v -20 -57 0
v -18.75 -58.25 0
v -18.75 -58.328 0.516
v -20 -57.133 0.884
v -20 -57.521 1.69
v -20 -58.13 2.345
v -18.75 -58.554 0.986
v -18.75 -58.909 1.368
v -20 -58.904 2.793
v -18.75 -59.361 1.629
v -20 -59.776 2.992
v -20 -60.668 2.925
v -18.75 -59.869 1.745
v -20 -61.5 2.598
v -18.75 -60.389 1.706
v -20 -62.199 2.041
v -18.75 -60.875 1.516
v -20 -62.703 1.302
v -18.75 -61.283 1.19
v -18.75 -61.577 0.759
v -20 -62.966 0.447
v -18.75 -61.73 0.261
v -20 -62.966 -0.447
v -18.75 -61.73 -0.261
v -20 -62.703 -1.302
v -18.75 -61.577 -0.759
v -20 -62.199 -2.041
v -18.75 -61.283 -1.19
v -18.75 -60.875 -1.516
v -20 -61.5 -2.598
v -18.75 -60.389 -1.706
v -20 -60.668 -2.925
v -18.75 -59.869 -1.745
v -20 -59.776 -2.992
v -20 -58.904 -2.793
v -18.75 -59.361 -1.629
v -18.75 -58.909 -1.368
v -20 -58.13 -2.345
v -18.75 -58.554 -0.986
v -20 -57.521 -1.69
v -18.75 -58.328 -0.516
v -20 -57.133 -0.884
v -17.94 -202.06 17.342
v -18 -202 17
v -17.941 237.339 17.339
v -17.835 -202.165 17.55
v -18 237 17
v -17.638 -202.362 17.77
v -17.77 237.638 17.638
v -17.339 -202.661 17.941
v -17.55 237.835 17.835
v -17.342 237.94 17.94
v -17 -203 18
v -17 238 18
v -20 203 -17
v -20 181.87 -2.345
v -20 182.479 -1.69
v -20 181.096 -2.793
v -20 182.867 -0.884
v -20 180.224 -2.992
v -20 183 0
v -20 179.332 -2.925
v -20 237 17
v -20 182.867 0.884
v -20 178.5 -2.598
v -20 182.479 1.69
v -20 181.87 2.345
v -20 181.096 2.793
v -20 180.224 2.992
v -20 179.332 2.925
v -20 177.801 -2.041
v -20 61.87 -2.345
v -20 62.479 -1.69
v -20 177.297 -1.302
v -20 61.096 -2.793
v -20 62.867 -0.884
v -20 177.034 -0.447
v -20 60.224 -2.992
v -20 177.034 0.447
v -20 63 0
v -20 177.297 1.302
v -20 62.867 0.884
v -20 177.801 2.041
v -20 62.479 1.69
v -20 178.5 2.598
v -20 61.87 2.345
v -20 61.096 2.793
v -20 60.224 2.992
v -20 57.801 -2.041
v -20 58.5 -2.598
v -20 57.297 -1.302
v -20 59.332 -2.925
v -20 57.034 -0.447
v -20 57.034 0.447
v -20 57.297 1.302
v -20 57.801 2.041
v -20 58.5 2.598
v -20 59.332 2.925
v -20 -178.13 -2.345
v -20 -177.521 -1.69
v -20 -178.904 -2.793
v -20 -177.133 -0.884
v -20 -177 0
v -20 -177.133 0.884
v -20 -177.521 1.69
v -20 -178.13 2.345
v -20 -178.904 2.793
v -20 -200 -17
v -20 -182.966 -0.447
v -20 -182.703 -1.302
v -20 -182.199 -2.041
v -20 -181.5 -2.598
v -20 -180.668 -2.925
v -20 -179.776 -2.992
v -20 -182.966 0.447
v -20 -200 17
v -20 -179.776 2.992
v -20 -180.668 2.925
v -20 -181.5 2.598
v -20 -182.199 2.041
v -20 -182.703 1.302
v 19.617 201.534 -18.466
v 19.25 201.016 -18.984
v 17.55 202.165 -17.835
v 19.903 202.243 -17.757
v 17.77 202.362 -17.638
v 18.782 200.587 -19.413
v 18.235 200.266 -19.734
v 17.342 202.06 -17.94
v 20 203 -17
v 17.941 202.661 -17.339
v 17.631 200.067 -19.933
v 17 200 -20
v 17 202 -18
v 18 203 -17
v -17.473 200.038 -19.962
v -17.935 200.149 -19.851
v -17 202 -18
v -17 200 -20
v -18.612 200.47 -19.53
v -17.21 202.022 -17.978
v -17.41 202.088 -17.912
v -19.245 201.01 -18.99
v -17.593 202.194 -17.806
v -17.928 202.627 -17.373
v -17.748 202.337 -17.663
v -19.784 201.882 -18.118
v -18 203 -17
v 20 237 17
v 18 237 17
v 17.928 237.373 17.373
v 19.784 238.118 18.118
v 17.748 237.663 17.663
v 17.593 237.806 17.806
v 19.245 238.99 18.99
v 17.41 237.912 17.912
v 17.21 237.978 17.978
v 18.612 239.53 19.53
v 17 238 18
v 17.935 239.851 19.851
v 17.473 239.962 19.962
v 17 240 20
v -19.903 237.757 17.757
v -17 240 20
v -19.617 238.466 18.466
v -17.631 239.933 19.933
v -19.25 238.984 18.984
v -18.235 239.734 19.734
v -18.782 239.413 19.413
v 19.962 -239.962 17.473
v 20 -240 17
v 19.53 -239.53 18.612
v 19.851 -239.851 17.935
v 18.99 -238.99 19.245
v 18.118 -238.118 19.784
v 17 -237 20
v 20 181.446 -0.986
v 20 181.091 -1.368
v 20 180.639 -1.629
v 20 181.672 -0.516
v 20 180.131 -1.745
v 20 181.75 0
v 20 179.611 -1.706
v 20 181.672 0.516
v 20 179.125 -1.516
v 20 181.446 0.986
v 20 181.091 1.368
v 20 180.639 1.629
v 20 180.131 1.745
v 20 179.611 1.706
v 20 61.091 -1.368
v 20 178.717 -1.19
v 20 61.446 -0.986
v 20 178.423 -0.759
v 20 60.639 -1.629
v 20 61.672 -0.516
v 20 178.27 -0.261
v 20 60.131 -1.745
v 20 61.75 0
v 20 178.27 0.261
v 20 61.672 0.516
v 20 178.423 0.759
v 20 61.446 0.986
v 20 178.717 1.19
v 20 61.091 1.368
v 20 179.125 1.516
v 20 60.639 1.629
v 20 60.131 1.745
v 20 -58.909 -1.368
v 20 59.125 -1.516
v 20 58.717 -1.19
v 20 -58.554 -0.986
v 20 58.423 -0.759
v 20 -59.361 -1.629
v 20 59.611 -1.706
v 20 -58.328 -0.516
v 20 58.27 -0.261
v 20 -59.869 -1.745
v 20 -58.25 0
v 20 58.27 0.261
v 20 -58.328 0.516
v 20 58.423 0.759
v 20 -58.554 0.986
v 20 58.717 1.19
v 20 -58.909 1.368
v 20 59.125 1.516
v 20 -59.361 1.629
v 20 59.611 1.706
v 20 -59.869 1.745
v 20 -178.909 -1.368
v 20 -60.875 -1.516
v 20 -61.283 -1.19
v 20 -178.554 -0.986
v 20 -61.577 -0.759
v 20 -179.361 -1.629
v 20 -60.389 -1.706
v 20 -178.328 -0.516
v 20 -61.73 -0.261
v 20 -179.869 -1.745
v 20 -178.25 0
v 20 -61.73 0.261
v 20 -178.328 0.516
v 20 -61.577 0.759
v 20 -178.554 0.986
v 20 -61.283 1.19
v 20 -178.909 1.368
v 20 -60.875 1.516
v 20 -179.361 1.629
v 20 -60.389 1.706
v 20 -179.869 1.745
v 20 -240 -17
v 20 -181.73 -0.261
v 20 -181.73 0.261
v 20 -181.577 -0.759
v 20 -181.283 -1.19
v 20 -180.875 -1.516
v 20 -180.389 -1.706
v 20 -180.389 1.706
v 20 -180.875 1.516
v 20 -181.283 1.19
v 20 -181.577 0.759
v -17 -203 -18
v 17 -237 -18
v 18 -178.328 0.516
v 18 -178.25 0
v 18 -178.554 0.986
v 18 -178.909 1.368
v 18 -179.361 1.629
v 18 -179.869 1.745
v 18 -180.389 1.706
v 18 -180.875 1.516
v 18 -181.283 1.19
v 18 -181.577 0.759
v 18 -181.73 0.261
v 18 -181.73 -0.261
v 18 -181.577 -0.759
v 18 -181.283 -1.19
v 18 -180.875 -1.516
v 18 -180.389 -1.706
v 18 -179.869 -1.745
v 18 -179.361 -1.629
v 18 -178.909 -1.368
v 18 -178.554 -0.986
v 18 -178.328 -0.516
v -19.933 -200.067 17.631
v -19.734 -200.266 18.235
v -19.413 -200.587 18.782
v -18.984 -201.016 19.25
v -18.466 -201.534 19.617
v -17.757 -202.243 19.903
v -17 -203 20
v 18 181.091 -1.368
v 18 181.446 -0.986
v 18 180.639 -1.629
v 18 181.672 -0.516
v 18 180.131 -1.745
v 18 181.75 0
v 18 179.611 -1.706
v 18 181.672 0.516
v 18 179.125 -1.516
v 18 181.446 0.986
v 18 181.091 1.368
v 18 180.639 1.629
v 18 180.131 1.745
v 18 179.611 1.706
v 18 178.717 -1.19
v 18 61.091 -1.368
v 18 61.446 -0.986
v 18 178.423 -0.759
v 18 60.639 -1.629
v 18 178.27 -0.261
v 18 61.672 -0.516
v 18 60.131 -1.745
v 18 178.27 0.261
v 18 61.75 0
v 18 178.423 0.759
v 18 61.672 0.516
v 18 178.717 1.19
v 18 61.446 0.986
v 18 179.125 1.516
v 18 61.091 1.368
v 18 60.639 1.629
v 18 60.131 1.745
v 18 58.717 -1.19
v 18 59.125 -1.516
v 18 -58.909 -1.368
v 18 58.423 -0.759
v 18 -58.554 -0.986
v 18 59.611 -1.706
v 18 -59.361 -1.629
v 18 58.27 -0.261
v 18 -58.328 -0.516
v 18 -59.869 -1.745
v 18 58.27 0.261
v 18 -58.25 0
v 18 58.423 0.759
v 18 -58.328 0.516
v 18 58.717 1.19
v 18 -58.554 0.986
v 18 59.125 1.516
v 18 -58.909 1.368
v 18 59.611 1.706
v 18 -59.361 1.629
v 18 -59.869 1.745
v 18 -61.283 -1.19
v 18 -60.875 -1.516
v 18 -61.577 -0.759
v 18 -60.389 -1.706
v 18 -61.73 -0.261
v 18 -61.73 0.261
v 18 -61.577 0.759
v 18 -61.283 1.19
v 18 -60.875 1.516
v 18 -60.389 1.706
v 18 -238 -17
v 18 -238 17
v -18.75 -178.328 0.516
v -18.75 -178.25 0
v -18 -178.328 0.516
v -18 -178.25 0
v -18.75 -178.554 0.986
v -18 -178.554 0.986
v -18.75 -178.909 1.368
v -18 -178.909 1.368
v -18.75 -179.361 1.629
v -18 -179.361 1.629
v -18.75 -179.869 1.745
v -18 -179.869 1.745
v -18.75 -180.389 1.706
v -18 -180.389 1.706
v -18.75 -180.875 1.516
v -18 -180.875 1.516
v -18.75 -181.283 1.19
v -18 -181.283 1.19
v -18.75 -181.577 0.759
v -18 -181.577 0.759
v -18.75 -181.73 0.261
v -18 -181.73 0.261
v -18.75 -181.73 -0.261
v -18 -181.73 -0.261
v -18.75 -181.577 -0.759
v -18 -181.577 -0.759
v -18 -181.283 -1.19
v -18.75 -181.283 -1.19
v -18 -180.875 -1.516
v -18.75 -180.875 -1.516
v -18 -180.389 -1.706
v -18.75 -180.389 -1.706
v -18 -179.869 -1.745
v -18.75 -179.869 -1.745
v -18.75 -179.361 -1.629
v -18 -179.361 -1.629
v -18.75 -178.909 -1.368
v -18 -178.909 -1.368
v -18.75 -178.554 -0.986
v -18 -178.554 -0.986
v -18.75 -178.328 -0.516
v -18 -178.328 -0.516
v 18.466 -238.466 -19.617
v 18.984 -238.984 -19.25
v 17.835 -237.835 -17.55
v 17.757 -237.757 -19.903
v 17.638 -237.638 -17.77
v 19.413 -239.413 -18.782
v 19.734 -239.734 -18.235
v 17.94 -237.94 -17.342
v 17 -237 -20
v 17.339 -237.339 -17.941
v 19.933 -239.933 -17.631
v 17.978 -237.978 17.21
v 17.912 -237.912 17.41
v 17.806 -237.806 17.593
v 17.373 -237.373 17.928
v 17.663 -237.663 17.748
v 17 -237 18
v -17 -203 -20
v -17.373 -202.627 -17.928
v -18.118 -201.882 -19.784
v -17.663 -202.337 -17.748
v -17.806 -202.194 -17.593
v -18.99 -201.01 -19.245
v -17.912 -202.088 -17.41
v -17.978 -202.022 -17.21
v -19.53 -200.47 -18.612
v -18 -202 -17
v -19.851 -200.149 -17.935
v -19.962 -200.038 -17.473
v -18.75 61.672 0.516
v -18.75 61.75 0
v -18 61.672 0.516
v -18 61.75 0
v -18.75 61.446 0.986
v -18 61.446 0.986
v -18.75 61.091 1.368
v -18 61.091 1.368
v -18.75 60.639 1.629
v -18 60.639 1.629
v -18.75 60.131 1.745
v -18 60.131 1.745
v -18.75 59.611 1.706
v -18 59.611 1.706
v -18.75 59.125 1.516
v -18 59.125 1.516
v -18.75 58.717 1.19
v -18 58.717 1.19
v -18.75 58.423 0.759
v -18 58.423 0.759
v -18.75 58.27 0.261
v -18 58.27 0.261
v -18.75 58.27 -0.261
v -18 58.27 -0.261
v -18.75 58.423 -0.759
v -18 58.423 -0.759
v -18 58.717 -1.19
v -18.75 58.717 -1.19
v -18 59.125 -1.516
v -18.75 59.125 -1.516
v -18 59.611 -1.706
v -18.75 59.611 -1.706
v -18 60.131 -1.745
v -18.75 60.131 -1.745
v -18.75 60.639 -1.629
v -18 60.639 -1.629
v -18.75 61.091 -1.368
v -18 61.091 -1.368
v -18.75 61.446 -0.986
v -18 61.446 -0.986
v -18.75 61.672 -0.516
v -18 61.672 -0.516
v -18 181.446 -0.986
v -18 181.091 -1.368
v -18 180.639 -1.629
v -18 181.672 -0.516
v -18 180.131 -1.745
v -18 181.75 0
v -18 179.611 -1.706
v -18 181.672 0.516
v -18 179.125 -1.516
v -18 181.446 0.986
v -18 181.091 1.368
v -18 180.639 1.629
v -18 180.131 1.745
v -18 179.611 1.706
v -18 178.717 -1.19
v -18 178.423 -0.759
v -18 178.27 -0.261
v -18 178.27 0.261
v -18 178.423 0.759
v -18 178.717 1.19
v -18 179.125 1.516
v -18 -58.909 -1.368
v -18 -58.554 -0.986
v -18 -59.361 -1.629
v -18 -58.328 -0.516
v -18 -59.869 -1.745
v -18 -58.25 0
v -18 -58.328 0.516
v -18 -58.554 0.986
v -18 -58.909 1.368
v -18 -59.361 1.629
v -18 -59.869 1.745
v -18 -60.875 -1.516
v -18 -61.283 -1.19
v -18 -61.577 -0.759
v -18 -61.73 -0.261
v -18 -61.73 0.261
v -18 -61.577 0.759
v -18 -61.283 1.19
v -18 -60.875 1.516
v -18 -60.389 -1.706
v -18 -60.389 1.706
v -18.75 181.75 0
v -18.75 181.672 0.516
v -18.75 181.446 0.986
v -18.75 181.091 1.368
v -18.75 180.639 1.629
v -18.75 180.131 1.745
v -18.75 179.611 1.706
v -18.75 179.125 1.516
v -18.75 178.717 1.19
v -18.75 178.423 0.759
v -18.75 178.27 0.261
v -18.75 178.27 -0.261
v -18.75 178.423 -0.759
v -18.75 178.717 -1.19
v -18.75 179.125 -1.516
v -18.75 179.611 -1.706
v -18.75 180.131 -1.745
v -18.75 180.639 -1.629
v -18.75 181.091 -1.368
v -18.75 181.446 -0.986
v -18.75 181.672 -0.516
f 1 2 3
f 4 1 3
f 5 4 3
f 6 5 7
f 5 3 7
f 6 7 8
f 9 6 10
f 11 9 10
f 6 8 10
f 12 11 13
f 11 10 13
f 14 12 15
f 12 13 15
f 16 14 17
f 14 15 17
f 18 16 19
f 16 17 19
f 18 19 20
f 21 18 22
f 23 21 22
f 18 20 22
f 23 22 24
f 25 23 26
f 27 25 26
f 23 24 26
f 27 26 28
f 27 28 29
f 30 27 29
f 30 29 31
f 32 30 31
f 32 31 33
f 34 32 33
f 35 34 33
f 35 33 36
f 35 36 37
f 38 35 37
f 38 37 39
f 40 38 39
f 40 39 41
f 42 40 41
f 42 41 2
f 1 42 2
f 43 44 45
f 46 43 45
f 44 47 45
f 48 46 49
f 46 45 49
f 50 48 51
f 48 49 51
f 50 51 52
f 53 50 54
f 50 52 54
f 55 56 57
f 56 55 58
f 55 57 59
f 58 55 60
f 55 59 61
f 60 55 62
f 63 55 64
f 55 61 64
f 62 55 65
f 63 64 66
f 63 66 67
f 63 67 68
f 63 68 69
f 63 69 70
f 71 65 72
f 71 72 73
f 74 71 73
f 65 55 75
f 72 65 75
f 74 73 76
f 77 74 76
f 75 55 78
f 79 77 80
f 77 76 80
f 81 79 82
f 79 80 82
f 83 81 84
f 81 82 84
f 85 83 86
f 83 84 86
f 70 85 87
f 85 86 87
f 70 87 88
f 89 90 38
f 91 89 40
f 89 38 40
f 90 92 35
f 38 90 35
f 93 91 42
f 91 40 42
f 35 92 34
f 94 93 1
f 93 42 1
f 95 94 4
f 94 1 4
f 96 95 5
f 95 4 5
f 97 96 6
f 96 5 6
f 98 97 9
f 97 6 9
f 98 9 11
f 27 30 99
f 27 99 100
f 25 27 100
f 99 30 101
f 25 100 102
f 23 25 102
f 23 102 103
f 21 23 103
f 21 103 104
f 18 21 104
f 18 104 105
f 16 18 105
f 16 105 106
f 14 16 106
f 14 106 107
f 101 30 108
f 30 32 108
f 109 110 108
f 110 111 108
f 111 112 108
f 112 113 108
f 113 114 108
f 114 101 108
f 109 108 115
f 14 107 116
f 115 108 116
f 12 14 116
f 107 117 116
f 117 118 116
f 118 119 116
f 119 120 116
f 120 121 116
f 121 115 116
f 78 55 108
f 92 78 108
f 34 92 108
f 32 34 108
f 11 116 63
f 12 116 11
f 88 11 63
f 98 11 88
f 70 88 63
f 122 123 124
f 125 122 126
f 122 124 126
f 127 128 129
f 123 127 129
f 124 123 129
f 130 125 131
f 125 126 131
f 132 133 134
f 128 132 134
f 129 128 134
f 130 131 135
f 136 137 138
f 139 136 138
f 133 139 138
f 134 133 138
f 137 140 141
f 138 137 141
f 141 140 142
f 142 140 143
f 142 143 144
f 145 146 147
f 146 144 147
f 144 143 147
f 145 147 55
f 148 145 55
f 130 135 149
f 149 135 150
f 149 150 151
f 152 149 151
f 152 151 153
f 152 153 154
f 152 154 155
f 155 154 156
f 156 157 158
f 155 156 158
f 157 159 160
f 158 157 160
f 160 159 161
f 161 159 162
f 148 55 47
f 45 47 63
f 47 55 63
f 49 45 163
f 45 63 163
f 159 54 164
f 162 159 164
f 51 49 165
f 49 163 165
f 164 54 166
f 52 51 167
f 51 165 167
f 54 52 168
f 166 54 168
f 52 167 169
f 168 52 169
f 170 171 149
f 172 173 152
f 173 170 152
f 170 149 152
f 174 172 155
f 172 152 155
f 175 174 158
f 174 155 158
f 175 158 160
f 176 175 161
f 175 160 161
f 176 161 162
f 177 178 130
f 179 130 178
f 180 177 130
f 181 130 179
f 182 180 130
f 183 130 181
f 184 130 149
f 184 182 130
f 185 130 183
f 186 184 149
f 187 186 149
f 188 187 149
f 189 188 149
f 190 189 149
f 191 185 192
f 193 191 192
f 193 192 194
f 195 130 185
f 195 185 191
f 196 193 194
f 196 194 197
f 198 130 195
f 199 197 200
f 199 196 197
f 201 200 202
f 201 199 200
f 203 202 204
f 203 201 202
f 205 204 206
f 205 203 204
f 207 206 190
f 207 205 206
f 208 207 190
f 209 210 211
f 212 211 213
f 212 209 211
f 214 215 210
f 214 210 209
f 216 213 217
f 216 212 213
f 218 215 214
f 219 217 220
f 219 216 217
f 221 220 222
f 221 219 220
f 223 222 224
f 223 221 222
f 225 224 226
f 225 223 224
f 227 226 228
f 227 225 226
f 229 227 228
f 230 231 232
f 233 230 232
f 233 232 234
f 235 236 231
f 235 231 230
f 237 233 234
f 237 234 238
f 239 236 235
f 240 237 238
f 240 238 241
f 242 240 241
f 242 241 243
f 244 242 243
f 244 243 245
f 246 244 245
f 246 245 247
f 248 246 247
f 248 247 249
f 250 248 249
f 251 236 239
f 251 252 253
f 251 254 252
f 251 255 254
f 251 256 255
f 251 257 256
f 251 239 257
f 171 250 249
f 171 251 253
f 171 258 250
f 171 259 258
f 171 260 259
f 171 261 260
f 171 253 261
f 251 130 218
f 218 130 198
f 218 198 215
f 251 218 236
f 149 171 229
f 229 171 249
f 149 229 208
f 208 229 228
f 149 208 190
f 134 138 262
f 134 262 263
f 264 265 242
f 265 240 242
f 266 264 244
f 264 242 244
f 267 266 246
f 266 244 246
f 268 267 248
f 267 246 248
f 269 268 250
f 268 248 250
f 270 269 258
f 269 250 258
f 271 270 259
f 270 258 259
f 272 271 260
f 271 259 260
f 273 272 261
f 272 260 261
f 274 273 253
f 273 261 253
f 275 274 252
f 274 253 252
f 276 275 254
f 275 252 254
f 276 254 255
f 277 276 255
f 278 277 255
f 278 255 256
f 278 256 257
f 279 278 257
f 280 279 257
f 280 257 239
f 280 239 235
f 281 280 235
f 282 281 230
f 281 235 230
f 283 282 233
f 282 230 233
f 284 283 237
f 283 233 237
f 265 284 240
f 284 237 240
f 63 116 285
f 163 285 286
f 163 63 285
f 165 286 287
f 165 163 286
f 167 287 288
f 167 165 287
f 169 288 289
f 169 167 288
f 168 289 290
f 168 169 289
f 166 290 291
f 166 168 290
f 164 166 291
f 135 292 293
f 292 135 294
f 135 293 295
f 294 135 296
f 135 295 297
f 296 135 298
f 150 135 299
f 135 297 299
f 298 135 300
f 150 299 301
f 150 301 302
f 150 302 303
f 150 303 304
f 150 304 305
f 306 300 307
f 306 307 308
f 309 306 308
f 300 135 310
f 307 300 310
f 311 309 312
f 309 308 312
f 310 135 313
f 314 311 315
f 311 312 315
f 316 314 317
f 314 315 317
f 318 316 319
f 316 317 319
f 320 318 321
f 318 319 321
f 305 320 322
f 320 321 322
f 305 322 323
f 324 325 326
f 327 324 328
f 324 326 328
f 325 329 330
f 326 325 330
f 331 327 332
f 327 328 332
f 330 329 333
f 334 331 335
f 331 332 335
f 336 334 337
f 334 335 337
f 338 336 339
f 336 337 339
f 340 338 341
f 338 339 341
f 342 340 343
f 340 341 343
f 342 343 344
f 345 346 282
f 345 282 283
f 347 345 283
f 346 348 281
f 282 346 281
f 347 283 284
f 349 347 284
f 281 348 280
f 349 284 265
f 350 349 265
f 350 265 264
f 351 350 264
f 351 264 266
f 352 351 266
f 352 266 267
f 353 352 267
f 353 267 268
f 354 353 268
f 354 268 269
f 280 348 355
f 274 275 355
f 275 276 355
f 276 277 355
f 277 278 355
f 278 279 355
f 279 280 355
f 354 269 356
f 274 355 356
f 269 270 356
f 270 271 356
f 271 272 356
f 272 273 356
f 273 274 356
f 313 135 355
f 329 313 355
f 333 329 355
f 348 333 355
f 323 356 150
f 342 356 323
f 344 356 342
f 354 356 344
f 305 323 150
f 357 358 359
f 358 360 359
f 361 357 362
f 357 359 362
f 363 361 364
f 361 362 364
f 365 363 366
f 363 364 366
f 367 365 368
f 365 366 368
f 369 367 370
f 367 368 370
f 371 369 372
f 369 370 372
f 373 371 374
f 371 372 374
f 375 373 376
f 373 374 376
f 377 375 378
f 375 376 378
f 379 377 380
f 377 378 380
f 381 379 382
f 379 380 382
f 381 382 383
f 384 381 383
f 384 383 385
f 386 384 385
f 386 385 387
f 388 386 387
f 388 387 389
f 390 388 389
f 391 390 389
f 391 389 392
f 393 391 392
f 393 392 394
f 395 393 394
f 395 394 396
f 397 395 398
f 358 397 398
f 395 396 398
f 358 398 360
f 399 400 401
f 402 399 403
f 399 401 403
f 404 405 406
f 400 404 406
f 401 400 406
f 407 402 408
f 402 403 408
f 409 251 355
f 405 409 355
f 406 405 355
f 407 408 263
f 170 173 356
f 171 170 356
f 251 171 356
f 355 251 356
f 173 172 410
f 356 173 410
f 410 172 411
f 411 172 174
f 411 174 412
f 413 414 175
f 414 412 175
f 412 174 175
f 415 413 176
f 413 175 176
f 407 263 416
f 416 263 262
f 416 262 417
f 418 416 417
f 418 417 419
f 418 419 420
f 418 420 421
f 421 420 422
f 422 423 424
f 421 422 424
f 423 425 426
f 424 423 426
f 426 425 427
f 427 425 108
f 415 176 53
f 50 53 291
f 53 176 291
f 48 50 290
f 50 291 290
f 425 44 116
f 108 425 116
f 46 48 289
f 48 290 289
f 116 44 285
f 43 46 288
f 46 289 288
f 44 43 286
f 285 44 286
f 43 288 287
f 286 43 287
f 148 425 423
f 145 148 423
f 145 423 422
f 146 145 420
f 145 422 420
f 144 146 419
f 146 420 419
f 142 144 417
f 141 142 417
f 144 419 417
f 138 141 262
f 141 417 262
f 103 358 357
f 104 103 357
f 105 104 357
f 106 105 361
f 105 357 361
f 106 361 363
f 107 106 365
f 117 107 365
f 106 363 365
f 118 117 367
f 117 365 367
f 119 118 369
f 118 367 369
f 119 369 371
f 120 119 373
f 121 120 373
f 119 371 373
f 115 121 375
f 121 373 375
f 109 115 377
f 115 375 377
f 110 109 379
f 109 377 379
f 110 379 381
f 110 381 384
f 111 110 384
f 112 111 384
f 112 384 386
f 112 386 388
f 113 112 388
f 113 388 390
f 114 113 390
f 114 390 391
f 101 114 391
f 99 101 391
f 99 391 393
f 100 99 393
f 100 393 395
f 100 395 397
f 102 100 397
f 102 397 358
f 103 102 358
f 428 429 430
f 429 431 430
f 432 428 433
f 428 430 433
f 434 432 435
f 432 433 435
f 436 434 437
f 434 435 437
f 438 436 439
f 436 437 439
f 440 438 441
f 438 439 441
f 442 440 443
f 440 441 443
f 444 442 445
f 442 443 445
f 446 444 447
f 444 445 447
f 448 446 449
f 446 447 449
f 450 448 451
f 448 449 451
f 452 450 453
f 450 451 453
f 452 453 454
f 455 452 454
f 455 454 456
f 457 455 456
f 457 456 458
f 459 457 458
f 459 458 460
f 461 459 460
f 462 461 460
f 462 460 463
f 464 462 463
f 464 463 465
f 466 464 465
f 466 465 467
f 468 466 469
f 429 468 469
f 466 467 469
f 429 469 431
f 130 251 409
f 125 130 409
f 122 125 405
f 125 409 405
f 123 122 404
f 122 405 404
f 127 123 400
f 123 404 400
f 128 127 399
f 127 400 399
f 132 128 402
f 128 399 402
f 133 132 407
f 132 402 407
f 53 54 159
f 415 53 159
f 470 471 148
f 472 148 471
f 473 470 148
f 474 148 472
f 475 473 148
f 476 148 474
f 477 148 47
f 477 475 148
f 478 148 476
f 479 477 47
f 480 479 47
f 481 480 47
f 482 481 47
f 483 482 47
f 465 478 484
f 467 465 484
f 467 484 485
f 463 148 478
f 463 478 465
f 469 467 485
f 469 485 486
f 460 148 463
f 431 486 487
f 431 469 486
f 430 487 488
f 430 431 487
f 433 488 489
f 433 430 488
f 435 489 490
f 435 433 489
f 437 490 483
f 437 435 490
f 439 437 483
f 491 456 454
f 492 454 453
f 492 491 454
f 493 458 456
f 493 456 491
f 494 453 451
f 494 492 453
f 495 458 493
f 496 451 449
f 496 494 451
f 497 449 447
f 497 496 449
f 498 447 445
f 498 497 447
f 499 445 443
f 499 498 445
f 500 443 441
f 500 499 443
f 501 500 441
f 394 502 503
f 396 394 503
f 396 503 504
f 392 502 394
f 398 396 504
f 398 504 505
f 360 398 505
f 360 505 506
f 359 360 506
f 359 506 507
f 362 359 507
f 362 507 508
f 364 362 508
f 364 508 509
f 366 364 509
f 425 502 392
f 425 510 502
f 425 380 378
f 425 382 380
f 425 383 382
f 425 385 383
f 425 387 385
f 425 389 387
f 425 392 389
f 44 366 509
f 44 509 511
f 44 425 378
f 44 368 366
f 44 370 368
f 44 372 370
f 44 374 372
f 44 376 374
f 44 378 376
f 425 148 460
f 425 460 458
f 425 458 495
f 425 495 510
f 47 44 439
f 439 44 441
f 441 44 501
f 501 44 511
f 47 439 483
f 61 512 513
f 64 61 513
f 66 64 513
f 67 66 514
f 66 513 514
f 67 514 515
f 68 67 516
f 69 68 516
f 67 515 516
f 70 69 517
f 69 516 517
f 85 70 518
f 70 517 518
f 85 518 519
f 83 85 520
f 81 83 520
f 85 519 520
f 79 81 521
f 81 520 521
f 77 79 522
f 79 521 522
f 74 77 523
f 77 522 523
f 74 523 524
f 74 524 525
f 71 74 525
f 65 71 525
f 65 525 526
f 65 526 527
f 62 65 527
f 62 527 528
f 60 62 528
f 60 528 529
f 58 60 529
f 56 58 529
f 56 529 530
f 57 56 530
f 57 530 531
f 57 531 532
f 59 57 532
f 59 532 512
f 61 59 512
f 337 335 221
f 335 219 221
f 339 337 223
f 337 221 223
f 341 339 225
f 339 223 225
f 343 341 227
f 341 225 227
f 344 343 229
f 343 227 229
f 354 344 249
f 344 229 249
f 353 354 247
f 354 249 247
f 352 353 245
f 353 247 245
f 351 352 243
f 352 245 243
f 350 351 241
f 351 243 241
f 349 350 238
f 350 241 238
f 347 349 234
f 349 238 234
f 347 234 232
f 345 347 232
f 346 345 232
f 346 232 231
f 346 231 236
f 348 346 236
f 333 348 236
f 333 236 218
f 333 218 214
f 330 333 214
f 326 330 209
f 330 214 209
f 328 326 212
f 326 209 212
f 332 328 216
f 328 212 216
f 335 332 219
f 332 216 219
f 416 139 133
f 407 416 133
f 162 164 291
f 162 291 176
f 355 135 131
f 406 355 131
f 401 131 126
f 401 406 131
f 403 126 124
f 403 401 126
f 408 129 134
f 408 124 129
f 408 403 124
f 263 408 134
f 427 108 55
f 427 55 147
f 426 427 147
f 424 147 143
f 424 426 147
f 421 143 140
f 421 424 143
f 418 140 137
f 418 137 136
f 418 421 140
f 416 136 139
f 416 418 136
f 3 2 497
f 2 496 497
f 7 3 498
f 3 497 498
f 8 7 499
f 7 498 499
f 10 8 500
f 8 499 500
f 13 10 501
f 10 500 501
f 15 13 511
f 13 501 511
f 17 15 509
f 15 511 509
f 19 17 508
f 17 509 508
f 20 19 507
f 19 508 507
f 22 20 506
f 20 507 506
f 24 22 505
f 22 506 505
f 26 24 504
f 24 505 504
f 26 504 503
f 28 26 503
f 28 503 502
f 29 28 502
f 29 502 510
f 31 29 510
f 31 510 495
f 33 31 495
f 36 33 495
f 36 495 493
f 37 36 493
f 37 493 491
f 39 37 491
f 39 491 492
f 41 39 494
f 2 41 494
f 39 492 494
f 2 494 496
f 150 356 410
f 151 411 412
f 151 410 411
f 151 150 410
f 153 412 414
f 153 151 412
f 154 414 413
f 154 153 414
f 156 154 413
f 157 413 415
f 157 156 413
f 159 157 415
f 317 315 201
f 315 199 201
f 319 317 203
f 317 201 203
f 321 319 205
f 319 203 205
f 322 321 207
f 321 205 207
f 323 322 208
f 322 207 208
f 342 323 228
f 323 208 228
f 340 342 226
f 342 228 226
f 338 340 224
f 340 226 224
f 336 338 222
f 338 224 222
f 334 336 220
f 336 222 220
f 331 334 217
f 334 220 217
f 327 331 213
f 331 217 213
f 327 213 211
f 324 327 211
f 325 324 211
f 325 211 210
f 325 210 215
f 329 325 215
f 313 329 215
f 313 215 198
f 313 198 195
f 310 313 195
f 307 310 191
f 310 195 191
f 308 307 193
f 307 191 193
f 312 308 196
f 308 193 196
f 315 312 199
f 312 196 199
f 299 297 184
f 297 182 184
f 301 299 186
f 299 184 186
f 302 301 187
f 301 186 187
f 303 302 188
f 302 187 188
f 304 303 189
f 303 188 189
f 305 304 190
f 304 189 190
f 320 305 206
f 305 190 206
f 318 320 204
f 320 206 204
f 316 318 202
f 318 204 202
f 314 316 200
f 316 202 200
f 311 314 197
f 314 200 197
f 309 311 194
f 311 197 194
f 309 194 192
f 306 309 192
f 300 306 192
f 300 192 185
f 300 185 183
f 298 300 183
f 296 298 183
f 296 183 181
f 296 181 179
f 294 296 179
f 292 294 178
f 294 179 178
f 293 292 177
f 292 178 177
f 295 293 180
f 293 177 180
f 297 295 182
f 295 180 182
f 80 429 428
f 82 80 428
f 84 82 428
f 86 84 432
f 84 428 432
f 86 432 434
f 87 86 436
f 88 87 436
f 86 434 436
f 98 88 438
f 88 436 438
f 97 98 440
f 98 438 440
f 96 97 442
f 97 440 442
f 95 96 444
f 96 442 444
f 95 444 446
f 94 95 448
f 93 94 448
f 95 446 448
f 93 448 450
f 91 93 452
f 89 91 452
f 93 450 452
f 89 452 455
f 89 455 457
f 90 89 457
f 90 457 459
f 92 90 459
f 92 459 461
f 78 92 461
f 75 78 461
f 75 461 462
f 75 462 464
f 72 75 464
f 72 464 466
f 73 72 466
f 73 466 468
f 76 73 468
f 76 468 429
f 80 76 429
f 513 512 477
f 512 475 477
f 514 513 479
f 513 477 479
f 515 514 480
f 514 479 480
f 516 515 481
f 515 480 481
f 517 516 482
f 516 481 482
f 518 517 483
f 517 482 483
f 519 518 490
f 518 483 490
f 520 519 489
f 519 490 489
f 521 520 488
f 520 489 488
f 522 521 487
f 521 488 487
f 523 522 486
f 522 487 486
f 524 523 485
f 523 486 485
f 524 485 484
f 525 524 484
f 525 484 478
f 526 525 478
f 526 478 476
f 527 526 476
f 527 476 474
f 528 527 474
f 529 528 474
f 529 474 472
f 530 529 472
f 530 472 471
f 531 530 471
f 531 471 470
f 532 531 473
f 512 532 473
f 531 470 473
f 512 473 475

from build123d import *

# Parameters (mm, degrees)
F2_W            = 40
F2_H            = 40
F3_DEPTH        = 240
F4_R            = 3
F5_T            = -2
F7_DEPTH        = 40.001
F9_DEPTH        = 40.001
F11_D           = 3.5
F11_CSINK_D     = 6
F11_CSINK_ANGLE = 90


with BuildPart() as f3:
    # F2 (on Front) → F3 (new body, symmetric)
    with BuildSketch(Plane.XZ):
        Rectangle(F2_W, F2_H)
    extrude(amount=F3_DEPTH, both=True)

    # F4
    f4_edges = [f3.edges().sort_by_distance(p)[0] for p in [
        (20, 0, 20),
        (-20, 0, 20),
        (20, 0, -20),
        (-20, 0, -20),
    ]]
    fillet(f4_edges, radius=F4_R)

    # F5
    f5_openings = [f3.faces().sort_by_distance(p)[0] for p in [
        (0, -240, 0),
        (0, 240, 0),
    ]]
    offset(amount=F5_T, openings=f5_openings)

    # F6 (on face) → F7 (cut, through all)
    with BuildSketch(Plane(origin=(-20, 0, 0), x_dir=(0, -1, 0), z_dir=(-1, 0, 0))):
        Polygon((-240, 20), (-240, -20), (-200, -20), align=None)
    extrude(amount=-F7_DEPTH, mode=Mode.SUBTRACT)

    # F8 (on face) → F9 (cut, through all)
    with BuildSketch(Plane.XY.offset(20)):
        Polygon((-20, -200), (-20, -240), (20, -240), align=None)
    extrude(amount=-F9_DEPTH, mode=Mode.SUBTRACT)

    # F11 (through all)
    with Locations(Plane(origin=(-20, 0, 0), x_dir=(0, -1, 0), z_dir=(-1, 0, 0))):
        with Locations((-180, 0), (-60, 0), (60, 0), (180, 0)):
            CounterSinkHole(F11_D / 2, F11_CSINK_D / 2, counter_sink_angle=F11_CSINK_ANGLE)


solid = f3.part
